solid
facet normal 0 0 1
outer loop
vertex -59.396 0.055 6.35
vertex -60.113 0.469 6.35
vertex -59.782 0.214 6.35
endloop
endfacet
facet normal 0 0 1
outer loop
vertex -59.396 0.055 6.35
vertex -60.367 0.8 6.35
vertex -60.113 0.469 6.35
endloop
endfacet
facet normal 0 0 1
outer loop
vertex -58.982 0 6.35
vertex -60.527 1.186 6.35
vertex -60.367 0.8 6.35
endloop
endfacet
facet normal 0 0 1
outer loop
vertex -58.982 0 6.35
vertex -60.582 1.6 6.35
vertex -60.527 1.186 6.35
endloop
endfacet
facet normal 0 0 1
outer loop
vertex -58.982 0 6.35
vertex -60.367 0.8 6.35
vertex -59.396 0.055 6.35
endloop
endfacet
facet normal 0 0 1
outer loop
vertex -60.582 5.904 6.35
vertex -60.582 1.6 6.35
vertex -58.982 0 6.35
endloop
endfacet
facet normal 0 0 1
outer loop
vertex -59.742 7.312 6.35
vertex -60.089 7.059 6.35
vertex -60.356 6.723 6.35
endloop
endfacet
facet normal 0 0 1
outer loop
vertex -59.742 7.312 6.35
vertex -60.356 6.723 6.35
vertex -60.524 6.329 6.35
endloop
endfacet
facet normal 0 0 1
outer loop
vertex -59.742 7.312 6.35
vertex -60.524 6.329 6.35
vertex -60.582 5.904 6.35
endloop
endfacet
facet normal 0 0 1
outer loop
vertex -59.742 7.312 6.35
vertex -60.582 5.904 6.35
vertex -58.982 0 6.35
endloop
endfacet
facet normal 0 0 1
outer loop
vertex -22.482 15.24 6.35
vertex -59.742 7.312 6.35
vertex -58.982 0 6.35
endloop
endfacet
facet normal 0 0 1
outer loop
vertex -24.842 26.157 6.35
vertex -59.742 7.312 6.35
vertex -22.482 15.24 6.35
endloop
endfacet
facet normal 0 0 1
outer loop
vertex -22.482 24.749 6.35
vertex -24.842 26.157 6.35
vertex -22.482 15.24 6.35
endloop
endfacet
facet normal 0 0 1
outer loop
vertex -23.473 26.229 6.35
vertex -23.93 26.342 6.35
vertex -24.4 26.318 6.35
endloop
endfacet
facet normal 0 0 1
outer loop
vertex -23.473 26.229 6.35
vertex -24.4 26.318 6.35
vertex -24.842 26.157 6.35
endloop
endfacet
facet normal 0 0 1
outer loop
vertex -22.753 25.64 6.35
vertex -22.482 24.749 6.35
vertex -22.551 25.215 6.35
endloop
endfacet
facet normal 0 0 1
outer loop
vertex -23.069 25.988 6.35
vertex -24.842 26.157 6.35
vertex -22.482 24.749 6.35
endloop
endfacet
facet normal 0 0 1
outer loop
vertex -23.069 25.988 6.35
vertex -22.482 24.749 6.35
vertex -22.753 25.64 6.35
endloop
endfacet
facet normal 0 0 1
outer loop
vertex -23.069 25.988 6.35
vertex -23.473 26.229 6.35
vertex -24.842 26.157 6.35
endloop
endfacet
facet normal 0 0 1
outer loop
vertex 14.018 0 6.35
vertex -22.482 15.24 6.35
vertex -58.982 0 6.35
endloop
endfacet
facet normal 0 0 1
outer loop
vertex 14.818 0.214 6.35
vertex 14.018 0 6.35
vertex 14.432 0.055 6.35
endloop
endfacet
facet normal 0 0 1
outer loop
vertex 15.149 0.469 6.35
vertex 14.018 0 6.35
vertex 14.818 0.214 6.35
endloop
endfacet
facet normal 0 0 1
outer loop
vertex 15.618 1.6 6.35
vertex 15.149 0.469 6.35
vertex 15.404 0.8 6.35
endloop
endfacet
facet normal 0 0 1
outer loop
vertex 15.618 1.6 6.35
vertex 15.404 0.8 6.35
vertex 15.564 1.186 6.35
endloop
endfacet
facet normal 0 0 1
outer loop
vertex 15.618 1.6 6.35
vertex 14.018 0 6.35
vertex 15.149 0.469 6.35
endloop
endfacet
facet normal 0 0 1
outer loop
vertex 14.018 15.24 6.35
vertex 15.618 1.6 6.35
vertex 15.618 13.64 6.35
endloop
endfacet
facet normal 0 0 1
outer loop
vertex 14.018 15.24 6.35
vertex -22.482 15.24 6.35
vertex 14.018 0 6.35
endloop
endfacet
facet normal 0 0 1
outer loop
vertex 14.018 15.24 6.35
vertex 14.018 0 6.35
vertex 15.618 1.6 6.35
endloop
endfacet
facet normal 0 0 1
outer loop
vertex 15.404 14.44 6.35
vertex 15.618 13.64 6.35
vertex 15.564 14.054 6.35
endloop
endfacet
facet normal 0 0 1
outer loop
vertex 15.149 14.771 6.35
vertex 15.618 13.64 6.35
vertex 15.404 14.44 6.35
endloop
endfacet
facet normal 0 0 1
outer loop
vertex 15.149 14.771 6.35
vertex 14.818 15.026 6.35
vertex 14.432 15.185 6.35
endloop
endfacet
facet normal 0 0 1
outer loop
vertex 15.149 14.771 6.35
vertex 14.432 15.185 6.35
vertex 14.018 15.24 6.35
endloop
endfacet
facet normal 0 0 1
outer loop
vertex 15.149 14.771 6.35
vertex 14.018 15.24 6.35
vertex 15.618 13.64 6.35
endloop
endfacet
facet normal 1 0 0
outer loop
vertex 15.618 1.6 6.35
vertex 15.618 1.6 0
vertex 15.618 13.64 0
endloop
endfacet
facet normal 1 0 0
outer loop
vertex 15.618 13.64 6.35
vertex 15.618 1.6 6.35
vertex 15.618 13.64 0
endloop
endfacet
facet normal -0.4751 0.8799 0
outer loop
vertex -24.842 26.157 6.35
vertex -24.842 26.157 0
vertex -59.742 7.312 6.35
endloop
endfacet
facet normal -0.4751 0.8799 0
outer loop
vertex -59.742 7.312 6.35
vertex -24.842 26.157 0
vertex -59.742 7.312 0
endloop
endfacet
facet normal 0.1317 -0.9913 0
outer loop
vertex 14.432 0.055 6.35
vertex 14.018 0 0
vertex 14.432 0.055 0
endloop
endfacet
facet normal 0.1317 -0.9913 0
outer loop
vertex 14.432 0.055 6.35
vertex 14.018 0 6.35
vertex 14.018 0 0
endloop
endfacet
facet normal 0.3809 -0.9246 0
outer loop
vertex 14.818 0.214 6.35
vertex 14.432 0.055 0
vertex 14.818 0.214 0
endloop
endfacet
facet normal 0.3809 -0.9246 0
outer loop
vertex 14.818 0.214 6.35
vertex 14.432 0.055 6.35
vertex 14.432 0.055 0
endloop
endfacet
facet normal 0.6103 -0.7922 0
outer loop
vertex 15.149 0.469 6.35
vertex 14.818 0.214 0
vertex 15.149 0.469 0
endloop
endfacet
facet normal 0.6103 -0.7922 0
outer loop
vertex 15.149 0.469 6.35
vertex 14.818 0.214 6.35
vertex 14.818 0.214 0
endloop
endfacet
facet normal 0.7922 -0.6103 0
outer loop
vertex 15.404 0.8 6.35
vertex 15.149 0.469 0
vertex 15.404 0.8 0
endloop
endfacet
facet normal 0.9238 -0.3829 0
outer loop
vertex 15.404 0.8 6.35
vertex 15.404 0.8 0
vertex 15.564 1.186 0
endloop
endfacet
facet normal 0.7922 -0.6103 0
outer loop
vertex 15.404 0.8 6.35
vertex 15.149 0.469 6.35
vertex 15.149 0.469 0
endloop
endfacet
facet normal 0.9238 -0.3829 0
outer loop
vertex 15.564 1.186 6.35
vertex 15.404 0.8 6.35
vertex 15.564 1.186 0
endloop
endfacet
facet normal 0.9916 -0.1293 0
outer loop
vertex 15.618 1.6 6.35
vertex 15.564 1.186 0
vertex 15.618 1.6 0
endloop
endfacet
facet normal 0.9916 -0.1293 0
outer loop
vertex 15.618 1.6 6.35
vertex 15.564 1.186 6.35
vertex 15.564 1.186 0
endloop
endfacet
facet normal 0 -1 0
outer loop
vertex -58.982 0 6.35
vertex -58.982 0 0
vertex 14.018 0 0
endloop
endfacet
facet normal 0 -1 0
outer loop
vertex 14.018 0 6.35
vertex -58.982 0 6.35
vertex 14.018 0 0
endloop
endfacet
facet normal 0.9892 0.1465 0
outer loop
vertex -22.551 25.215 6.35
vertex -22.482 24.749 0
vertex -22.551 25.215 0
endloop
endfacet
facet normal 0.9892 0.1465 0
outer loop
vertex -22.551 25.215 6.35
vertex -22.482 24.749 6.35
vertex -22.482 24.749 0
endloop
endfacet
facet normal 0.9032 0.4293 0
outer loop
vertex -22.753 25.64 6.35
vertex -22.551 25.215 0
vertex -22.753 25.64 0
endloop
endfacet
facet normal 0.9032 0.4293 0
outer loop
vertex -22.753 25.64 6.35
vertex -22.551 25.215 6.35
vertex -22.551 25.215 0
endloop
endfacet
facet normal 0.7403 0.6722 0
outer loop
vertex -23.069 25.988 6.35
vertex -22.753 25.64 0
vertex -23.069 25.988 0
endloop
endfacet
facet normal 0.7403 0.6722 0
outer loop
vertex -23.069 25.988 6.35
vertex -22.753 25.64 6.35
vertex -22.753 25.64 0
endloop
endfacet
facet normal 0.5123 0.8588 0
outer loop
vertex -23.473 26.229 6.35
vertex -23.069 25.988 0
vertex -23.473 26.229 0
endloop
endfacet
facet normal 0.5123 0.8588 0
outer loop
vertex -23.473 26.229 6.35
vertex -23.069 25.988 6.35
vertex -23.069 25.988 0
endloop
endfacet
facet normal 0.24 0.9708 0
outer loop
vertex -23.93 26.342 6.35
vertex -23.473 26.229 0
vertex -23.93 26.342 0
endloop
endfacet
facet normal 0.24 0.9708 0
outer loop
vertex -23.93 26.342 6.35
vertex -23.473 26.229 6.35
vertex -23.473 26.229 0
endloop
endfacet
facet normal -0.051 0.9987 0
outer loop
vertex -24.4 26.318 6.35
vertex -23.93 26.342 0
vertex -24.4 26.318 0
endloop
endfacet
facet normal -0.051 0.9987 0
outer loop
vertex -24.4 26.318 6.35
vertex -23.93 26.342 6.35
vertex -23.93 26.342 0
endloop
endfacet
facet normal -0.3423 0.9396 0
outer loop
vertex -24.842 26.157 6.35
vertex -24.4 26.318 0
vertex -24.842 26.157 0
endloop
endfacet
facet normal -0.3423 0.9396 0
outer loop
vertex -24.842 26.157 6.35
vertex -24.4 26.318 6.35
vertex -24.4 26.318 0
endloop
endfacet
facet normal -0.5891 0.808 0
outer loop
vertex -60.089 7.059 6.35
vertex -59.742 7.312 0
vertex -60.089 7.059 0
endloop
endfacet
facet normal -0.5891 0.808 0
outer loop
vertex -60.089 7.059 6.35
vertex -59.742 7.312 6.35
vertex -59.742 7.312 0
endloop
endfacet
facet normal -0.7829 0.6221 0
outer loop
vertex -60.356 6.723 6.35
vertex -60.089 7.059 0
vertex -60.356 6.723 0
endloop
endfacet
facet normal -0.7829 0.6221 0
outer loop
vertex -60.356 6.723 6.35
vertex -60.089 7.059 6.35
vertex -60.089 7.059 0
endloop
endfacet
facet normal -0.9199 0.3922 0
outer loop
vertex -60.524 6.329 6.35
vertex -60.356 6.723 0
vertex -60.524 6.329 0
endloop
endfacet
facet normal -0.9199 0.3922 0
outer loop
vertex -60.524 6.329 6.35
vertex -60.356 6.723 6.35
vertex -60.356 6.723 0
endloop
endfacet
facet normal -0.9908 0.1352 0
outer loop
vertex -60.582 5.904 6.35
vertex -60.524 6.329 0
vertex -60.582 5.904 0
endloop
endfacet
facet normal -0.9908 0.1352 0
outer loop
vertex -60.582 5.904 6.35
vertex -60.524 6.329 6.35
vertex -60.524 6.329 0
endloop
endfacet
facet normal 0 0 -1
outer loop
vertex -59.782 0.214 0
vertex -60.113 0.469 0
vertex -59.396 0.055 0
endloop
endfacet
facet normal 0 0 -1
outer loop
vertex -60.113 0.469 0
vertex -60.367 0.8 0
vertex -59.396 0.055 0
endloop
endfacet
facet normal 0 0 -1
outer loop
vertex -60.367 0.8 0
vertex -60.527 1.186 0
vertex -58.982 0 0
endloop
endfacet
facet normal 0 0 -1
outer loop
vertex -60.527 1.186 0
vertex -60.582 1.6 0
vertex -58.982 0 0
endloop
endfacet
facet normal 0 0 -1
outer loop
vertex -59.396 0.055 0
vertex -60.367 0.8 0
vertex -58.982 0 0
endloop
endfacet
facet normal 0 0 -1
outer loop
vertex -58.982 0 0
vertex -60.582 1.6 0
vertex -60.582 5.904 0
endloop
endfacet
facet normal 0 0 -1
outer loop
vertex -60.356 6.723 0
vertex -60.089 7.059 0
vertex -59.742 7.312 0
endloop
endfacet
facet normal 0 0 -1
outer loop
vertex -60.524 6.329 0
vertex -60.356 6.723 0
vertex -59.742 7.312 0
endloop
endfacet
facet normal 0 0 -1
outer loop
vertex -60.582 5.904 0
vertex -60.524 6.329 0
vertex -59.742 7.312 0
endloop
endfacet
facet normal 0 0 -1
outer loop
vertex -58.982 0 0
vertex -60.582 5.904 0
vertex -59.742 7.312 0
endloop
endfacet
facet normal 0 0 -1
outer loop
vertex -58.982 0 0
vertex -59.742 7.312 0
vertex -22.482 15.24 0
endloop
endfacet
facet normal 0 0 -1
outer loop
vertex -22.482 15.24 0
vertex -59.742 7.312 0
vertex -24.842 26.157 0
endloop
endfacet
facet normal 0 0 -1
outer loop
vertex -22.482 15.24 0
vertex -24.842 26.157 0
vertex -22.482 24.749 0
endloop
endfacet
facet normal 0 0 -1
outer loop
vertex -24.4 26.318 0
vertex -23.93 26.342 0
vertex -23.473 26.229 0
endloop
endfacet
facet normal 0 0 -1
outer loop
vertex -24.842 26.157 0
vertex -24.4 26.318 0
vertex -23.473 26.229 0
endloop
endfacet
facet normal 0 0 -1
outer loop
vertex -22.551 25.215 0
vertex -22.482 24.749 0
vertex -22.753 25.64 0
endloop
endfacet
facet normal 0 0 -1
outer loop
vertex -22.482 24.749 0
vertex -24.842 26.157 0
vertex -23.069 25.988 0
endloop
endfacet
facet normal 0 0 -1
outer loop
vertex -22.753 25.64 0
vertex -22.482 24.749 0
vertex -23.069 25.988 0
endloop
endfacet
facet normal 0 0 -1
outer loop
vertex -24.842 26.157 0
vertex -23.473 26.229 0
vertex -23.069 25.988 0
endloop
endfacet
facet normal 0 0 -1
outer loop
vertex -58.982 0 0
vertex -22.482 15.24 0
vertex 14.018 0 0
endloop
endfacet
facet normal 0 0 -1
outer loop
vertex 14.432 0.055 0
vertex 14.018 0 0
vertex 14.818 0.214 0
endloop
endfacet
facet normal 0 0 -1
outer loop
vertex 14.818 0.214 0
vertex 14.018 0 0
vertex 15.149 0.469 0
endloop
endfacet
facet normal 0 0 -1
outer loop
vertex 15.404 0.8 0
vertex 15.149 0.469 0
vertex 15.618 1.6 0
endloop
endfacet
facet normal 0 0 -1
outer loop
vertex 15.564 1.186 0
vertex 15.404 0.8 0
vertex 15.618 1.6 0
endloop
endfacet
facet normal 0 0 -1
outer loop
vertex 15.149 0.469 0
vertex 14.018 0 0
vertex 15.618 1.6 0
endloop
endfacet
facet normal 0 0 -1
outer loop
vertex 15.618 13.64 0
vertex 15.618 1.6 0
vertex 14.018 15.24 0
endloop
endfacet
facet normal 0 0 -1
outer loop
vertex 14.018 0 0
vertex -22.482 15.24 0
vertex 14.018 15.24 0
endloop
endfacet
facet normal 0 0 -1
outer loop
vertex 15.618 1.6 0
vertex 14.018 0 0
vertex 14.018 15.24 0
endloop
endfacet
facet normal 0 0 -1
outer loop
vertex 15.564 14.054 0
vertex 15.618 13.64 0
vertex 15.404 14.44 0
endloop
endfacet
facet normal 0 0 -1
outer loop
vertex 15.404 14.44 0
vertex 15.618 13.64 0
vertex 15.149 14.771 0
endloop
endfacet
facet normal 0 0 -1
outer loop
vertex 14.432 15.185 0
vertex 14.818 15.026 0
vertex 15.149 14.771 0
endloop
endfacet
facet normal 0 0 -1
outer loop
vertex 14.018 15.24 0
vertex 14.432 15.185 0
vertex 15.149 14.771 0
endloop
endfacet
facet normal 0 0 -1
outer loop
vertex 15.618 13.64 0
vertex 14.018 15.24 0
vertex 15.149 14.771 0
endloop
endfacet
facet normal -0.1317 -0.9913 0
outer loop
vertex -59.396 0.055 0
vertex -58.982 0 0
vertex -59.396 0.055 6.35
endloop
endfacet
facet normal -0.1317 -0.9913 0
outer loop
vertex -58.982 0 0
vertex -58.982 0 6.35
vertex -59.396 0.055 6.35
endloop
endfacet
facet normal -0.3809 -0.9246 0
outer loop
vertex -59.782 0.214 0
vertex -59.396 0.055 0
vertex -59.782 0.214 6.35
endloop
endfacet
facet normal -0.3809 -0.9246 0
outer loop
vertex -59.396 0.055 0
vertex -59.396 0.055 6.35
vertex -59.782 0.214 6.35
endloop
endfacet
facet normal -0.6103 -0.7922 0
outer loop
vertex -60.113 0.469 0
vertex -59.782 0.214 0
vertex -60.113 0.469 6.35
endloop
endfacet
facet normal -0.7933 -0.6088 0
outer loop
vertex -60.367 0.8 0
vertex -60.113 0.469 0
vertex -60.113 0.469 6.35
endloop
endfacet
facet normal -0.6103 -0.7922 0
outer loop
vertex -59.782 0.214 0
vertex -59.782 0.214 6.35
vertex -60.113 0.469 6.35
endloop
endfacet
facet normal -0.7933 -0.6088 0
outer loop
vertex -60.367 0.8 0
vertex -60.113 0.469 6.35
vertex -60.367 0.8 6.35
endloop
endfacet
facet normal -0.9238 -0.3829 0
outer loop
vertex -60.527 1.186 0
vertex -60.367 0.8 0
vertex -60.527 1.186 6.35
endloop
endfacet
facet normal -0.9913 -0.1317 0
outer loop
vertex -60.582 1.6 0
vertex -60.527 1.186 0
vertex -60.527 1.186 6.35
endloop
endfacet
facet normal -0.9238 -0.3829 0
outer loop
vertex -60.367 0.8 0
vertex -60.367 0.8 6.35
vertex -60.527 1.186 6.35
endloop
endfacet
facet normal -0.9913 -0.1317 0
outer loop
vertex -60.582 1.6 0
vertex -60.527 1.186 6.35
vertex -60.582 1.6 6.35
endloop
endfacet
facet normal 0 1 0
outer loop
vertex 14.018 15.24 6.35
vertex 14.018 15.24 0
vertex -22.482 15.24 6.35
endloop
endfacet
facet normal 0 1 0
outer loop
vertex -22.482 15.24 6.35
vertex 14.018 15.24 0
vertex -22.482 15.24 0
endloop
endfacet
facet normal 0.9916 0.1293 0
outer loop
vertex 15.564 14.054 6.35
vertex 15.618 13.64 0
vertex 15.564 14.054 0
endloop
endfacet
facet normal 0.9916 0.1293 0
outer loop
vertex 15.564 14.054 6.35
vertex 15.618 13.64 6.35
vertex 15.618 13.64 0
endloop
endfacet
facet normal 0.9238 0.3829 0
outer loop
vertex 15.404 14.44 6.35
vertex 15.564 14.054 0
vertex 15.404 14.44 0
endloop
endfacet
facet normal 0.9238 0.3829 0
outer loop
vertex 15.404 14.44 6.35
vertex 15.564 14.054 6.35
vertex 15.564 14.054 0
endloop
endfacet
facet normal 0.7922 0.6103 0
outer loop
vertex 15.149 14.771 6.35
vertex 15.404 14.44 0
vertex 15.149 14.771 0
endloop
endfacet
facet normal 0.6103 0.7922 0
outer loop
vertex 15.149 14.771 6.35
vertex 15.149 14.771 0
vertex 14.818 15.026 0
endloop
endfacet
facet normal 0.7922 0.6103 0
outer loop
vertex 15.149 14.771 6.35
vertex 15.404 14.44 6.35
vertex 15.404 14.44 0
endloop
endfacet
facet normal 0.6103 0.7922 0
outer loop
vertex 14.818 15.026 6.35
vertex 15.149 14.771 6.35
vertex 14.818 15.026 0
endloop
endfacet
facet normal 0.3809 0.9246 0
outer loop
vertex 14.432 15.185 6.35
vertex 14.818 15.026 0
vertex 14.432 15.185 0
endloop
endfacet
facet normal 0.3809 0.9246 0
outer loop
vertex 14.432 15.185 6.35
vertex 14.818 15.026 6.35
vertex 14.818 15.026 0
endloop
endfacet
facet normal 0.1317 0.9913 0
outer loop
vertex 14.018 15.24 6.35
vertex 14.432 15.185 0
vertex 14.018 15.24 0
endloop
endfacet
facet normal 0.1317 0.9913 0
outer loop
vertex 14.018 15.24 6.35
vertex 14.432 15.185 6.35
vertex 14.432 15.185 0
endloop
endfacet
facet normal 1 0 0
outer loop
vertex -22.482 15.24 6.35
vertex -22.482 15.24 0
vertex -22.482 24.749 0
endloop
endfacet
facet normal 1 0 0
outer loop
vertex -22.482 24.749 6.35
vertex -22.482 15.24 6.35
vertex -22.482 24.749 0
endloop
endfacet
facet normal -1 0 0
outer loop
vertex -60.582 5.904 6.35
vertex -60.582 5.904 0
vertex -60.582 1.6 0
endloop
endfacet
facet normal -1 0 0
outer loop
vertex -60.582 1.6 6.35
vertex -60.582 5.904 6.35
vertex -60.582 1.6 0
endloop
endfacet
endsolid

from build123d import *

# Parameters (mm, degrees)
F1_DEPTH = 6.35
F2_R     = 1.6002


with BuildPart() as f1:
    # F0 (on Top) → F1 (new body)
    with BuildSketch(Plane.XY):
        Polygon((-60.581866, 0), (0, 0), (15.618134, 0), (15.618134, 15.24), (-22.481866, 15.24), (-22.481866, 27.432), (-60.581866, 6.858), align=None)
    extrude(amount=F1_DEPTH)

    # F2
    f2_edges = [f1.edges().sort_by_distance(p)[0] for p in [
        (-60.581866, 6.858, 3.175),
        (-60.581866, 0, 3.175),
        (-22.481866, 27.432, 3.175),
        (15.618134, 15.24, 3.175),
        (15.618134, 0, 3.175),
    ]]
    fillet(f2_edges, radius=F2_R)


solid = f1.part
